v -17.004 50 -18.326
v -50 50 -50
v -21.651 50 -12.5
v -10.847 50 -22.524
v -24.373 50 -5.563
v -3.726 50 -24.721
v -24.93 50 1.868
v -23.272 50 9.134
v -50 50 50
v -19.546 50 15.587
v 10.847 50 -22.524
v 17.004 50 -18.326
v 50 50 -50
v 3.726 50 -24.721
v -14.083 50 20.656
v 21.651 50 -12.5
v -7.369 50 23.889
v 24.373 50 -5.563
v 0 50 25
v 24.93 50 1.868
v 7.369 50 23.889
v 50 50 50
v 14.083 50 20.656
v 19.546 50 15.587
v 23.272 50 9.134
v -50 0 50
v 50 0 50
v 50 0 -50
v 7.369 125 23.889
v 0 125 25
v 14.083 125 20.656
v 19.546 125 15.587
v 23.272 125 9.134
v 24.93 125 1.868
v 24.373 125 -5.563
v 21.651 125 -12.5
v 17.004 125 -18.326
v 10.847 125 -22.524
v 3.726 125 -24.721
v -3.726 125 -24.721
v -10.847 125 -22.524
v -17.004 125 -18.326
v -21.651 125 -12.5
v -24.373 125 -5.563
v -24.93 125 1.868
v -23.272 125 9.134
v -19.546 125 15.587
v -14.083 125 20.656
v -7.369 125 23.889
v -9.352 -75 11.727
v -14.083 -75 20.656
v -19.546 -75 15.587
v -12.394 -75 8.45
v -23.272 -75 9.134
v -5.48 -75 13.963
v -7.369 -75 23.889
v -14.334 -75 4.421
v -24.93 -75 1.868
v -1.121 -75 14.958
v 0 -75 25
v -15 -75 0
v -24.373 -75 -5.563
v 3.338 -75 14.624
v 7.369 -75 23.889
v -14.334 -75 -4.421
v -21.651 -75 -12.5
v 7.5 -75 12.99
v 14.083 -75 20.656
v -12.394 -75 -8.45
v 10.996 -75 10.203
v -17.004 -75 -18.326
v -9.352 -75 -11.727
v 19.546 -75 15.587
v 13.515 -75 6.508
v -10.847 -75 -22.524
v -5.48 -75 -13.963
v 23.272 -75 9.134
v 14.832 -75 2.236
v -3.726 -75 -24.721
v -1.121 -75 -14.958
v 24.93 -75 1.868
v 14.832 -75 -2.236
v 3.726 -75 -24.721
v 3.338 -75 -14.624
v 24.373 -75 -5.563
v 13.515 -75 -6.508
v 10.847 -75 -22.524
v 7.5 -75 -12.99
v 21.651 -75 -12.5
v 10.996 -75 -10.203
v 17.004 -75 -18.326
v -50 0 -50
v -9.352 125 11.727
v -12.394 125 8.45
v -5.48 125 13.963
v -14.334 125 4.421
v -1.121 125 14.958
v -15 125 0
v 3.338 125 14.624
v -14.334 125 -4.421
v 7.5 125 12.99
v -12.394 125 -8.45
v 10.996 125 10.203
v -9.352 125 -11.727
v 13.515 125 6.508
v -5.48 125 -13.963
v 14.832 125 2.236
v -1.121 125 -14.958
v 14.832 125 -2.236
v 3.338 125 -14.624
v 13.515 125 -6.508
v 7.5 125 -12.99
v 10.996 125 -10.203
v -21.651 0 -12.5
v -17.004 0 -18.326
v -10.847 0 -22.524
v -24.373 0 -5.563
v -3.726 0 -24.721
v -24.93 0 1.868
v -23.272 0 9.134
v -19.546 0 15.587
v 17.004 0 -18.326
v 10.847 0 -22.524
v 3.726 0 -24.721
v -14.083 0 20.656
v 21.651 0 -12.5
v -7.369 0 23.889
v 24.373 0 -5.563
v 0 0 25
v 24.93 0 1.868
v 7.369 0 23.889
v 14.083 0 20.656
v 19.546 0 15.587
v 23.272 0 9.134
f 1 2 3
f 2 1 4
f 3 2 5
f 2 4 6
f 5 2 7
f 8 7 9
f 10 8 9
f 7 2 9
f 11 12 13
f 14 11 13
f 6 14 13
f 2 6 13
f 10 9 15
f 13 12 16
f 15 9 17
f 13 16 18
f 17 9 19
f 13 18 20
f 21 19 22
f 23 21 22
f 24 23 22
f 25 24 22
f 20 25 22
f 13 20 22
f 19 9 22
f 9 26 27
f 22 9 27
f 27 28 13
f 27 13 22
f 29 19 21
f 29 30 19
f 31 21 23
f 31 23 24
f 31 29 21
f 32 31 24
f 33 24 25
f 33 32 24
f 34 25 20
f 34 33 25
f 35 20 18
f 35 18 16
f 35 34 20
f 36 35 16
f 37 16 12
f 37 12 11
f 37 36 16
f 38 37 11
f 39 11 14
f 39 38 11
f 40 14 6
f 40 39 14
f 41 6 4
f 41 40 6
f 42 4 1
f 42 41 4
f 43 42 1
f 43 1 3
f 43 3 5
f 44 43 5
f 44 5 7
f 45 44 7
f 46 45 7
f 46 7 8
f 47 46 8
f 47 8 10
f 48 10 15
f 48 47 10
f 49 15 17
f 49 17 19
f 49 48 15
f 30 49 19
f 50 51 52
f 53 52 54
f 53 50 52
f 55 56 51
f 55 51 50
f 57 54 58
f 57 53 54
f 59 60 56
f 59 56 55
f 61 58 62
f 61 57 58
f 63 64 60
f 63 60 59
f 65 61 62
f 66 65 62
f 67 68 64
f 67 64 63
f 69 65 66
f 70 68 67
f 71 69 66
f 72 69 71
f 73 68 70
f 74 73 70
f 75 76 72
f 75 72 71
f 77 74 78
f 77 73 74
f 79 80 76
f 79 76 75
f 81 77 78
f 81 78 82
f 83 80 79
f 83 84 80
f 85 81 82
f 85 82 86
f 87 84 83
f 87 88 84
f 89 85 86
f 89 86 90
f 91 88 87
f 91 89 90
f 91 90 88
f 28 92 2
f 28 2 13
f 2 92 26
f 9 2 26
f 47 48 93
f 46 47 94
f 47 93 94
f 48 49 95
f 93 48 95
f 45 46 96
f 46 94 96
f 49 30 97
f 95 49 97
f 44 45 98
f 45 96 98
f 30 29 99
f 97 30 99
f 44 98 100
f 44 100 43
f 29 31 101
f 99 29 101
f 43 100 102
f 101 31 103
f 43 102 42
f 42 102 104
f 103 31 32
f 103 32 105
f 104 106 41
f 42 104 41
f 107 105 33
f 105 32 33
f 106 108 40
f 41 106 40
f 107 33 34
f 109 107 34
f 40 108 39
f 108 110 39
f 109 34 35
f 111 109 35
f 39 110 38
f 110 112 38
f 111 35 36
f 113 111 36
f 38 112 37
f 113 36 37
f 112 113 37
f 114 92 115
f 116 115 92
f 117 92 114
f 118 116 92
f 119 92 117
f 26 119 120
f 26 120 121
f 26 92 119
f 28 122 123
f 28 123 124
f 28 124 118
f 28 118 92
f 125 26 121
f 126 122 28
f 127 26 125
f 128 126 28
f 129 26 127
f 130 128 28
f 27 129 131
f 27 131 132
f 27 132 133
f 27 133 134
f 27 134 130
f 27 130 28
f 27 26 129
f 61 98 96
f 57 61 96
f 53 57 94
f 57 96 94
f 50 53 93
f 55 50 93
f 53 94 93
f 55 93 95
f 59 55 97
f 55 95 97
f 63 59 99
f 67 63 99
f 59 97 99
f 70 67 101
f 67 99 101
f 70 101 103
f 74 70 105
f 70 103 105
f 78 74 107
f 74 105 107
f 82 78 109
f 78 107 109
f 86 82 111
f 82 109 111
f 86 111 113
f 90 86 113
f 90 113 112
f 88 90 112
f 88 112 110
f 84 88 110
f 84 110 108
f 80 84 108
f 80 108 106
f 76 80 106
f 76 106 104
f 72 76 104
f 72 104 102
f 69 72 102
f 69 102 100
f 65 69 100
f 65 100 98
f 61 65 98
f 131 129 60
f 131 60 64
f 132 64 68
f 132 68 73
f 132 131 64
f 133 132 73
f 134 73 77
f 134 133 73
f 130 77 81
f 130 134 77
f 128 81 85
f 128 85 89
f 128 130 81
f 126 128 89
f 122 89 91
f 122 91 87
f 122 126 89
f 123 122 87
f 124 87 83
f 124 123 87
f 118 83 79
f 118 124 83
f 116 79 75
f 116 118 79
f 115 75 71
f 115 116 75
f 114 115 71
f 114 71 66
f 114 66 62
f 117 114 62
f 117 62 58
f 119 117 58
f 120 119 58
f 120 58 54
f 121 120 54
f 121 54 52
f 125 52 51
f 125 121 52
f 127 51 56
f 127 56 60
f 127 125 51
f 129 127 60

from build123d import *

# Parameters (mm, degrees)
F0_W     = 100
F0_H     = 100
F1_DEPTH = 50
F2_W     = 200
F2_H     = 25
F5_D     = 30


with BuildPart() as f1:
    # F0 (on Front) → F1 (new body)
    with BuildSketch(Plane.XZ):
        Rectangle(F0_W, F0_H)
    extrude(amount=-F1_DEPTH)

    # F2 (on Right) → F3 (revolve)
    with BuildSketch(Plane.YZ):
        with Locations((25, 12.5)):
            Rectangle(F2_W, F2_H)
    revolve(axis=Axis((0, 49.7826111294, 0), (0, 1, 0)))

    # F5 (through all)
    with Locations(Plane.XZ.offset(75)):
        with Locations((0, 0)):
            Hole(F5_D / 2)


solid = f1.part
